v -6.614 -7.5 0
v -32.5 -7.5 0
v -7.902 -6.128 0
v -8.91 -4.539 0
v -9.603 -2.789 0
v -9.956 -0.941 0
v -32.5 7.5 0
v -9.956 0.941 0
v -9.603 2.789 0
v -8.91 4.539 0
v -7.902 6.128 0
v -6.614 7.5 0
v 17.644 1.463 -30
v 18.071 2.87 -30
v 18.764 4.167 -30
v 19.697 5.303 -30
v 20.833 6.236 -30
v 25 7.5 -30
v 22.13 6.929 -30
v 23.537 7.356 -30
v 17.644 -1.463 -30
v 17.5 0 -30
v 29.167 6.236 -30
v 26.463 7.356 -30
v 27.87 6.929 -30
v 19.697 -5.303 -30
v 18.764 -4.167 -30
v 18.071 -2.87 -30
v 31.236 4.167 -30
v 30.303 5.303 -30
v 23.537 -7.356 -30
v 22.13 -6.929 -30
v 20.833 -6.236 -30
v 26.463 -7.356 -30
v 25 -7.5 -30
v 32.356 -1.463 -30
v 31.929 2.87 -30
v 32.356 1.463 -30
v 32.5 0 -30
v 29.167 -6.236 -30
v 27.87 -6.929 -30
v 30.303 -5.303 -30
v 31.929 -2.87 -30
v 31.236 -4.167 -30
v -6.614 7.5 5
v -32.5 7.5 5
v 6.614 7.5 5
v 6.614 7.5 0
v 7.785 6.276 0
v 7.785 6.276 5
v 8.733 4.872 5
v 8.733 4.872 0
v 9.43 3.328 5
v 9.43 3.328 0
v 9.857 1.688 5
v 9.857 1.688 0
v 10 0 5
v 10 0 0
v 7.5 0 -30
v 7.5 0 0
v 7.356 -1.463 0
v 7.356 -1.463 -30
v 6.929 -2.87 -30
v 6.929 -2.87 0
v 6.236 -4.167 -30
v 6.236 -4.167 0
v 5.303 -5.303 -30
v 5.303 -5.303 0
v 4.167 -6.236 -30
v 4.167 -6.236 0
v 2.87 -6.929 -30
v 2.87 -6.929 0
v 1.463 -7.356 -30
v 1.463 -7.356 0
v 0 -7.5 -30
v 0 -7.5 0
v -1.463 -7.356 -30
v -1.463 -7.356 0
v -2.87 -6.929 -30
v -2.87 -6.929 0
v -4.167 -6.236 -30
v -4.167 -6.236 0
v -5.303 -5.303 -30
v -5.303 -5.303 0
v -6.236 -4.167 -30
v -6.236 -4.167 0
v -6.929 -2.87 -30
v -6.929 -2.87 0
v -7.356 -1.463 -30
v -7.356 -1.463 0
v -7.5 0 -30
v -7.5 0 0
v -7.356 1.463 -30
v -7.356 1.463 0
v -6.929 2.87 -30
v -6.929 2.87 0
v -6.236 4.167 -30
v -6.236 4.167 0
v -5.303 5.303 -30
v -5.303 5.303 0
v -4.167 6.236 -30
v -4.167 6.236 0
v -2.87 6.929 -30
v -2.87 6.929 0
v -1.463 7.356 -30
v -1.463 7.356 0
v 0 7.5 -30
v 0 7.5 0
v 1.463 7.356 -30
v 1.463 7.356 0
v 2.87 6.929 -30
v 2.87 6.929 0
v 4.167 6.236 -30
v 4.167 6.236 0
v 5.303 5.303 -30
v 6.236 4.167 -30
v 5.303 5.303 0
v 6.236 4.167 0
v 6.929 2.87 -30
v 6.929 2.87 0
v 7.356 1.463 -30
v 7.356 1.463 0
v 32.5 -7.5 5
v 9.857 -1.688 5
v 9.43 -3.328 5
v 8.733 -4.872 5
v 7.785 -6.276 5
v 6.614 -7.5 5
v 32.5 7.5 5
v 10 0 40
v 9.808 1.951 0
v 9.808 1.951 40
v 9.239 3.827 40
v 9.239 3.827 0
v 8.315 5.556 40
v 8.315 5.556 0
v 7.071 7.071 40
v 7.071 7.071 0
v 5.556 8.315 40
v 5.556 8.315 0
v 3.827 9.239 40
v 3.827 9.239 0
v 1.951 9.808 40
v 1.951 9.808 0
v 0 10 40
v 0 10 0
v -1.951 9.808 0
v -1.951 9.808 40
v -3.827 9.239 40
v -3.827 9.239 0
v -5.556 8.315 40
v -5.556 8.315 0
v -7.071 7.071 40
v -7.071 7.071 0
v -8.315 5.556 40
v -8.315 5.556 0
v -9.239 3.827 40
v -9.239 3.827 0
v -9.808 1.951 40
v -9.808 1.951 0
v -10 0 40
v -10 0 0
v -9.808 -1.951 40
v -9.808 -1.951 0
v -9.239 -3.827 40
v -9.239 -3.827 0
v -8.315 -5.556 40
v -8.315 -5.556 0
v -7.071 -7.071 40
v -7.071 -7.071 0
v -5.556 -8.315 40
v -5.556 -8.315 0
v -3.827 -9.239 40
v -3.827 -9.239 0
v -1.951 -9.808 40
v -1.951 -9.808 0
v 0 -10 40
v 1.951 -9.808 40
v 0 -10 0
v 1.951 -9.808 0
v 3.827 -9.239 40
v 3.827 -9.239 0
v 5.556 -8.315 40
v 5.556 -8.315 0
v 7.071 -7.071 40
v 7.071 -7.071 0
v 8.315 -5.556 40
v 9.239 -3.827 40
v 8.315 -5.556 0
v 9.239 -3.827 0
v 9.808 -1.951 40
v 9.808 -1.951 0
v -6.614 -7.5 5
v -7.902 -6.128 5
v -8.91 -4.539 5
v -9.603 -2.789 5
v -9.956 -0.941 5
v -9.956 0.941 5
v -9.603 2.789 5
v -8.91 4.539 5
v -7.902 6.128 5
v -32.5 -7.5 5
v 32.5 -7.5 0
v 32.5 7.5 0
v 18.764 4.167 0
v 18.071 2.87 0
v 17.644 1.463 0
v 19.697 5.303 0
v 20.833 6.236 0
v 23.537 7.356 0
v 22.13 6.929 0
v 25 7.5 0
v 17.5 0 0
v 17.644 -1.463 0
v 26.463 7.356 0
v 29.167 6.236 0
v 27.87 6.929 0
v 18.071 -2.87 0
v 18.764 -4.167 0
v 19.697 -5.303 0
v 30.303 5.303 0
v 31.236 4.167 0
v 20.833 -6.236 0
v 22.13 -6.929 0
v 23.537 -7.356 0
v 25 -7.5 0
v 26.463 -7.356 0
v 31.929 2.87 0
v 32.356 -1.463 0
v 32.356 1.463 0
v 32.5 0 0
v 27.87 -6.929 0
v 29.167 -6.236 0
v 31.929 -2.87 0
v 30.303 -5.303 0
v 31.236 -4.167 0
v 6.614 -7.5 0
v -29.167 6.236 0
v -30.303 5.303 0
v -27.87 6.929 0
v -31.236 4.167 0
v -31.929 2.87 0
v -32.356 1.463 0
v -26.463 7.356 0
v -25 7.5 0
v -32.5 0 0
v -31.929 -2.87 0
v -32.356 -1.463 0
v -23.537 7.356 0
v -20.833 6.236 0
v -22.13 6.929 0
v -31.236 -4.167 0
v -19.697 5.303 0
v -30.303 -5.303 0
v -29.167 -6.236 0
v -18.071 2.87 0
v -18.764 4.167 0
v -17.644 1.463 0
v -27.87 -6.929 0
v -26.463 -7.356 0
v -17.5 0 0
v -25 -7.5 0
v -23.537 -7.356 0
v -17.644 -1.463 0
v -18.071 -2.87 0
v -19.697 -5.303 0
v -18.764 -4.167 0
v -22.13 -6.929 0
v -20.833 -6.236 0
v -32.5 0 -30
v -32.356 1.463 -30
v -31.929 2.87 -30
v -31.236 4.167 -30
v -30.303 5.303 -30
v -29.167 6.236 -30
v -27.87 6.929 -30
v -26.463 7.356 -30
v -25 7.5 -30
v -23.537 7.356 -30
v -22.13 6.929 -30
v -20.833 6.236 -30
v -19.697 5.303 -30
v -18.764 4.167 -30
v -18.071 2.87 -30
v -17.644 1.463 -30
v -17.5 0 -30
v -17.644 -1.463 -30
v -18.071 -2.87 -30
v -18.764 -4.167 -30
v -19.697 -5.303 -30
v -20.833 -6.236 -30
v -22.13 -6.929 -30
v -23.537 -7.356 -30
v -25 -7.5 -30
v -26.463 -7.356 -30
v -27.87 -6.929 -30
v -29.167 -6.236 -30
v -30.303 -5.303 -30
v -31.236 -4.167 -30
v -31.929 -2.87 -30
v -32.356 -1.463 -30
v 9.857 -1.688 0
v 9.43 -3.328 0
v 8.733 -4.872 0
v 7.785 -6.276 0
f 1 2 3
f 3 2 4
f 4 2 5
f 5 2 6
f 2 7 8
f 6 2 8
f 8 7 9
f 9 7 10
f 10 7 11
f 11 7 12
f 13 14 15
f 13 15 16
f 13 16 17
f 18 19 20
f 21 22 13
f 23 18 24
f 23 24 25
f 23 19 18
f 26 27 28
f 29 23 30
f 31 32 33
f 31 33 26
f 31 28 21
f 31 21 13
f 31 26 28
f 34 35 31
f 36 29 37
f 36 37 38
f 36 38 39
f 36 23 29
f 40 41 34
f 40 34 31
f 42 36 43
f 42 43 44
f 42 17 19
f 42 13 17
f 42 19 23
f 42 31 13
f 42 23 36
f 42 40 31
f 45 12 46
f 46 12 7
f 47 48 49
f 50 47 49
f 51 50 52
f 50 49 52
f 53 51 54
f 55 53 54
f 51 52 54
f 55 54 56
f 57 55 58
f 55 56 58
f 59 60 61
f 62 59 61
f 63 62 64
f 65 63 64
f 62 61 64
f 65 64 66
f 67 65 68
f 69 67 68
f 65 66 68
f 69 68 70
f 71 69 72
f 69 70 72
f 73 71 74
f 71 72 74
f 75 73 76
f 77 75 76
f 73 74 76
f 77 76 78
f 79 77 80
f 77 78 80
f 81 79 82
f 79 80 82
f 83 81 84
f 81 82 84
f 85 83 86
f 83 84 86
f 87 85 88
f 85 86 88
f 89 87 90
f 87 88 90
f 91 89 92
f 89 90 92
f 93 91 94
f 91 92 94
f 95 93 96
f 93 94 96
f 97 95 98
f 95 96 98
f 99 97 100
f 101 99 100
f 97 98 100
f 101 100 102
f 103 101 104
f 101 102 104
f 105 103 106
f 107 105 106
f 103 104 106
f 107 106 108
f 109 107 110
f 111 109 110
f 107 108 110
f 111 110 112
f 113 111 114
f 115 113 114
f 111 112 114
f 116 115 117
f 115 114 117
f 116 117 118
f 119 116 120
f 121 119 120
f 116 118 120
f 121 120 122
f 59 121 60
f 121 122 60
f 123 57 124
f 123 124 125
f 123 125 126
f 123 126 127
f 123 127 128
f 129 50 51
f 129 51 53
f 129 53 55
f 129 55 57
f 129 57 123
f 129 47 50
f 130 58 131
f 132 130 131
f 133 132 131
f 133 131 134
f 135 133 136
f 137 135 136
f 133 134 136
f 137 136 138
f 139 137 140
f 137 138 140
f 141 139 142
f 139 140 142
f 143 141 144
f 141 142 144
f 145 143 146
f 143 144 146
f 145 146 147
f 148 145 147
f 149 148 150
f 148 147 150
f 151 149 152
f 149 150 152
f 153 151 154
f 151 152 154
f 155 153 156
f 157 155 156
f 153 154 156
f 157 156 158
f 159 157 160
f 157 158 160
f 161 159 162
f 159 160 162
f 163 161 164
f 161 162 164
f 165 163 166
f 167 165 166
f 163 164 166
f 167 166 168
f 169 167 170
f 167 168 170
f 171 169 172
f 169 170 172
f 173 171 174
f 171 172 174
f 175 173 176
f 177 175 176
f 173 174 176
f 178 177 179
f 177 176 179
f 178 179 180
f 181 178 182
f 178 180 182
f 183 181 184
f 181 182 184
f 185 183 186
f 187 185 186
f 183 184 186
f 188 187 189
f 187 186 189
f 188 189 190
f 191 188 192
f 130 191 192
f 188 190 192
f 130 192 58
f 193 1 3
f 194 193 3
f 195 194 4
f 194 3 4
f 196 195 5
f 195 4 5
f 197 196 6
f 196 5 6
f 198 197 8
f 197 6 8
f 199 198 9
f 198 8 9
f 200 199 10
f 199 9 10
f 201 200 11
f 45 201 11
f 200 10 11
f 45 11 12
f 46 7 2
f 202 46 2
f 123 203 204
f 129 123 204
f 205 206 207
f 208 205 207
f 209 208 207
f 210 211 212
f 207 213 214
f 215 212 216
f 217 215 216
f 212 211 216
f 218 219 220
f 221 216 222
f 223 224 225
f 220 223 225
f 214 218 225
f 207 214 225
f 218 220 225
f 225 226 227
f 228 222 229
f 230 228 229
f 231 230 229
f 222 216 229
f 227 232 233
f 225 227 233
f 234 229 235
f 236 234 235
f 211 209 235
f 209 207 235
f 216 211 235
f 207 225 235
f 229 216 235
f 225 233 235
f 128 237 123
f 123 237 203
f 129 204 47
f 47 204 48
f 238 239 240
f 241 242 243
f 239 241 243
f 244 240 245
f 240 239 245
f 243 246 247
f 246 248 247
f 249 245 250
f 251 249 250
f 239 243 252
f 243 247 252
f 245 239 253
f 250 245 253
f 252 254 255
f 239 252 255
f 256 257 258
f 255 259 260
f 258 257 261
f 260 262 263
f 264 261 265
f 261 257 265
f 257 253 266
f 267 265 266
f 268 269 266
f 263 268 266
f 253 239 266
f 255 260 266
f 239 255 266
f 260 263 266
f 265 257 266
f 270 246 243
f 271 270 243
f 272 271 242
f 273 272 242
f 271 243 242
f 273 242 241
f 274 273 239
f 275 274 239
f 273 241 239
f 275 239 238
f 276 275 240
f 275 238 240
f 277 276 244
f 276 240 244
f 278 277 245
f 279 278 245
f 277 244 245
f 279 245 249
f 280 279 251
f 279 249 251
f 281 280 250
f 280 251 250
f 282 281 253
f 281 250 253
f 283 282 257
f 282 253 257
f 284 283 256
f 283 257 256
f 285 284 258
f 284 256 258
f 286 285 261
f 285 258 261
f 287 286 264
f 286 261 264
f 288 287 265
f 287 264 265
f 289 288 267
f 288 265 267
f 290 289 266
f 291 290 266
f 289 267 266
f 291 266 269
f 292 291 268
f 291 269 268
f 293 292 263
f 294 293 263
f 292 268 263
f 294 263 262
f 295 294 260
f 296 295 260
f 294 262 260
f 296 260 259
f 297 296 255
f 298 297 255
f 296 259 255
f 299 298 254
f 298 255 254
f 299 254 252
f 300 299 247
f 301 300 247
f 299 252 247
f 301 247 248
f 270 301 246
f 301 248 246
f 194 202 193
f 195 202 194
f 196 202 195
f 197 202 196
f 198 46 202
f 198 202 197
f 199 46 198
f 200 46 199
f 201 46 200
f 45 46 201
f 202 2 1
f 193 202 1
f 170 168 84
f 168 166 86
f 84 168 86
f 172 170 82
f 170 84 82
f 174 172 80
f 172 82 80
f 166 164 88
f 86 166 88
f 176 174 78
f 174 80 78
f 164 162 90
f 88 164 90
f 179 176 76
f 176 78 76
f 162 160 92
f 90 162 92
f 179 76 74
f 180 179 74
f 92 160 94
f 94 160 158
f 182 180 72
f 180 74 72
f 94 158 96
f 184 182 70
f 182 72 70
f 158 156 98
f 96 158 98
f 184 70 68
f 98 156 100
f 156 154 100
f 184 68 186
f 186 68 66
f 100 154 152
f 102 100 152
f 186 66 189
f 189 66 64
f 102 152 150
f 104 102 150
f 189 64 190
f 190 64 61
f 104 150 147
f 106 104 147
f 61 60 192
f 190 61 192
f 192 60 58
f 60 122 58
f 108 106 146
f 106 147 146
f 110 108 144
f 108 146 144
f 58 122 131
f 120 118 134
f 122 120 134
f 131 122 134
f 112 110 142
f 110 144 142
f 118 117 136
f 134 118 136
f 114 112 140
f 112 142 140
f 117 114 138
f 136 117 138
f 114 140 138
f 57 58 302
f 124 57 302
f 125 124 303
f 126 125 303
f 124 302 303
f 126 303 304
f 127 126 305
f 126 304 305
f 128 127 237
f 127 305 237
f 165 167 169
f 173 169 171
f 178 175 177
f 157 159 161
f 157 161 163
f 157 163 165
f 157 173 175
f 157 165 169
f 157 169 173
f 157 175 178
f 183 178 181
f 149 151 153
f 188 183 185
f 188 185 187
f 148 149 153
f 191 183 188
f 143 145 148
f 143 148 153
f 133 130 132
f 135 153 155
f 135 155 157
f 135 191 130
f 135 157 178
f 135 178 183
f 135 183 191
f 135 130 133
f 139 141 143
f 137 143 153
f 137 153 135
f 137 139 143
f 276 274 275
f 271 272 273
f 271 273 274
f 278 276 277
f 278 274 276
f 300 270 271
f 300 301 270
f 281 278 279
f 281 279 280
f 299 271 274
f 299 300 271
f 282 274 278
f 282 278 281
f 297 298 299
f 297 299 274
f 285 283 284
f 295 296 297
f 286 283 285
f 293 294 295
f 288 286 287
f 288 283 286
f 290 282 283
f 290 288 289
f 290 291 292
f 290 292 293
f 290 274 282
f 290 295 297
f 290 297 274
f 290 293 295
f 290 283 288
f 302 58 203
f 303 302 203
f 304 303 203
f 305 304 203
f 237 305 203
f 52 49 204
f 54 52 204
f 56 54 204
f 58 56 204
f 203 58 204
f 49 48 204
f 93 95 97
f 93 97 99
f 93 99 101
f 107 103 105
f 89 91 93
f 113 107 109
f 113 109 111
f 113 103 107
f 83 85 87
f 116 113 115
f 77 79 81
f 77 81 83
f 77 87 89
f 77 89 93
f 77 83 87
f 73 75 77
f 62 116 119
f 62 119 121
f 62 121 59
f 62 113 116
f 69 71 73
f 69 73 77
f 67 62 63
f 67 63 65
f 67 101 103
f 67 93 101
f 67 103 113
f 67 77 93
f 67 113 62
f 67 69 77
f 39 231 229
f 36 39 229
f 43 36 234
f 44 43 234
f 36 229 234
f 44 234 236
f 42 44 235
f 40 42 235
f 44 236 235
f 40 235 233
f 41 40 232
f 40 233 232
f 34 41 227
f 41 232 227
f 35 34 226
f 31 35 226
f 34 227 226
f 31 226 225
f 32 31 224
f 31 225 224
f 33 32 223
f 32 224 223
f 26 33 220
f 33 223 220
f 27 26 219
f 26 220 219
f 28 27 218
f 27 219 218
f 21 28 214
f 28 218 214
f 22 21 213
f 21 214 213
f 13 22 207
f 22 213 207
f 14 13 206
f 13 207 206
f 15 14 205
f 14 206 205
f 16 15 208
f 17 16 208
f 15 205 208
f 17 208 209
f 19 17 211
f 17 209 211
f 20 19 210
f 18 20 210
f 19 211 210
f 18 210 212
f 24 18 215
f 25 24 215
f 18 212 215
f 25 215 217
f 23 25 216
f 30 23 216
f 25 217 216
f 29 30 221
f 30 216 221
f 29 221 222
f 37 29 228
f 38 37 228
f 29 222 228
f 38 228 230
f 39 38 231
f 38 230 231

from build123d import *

# Parameters (mm, degrees)
F1_DEPTH = 5
F2_R     = 10
F3_DEPTH = 40
F4_R     = 7.5
F5_DEPTH = 30
F7_DEPTH = 30
F6_R     = 7.5


with BuildPart() as f1:
    # F0 (on Top) → F1 (new body)
    with BuildSketch(Plane.XY):
        with BuildLine():
            ThreePointArc((6.6143782777, 7.5), (9.1143782777, 4.1143782777), (10, 0))
            ThreePointArc((10, 0), (9.1143782777, -4.1143782777), (6.6143782777, -7.5))
            Line((6.6143782777, -7.5), (32.5, -7.5))
            Line((32.5, -7.5), (32.5, 7.5))
            Line((32.5, 7.5), (6.6143782777, 7.5))
        make_face()
    extrude(amount=F1_DEPTH)


with BuildPart() as f1b:
    # F0 (on Top) → F1, piece 2 (new body)
    with BuildSketch(Plane.XY):
        with BuildLine():
            ThreePointArc((-6.6143782777, -7.5), (-10, 0), (-6.6143782777, 7.5))
            Line((-6.6143782777, 7.5), (-32.5, 7.5))
            Line((-32.5, 7.5), (-32.5, -7.5))
            Line((-32.5, -7.5), (-6.6143782777, -7.5))
        make_face()
    extrude(amount=F1_DEPTH)


with BuildPart() as f3:
    # F2 (on Top) → F3 (new body)
    with BuildSketch(Plane.XY):
        Circle(F2_R)
    extrude(amount=F3_DEPTH)

    # F4 (on face) → F5 (join)
    with BuildSketch(Plane(origin=(0, 0, 0), x_dir=(1, 0, 0), z_dir=(0, 0, -1))):
        Circle(F4_R)
    extrude(amount=F5_DEPTH)


with BuildPart() as f7:
    # F6 (on face) → F7 (new body)
    with BuildSketch(Plane(origin=(0, 0, 0), x_dir=(1, 0, 0), z_dir=(0, 0, -1))):
        with BuildLine():
            ThreePointArc((-25, -7.5), (-19.6966991411, -5.3033008589), (-17.5, 0))
            ThreePointArc((-17.5, 0), (-19.6966991411, 5.3033008589), (-25, 7.5))
            ThreePointArc((-25, 7.5), (-30.3033008589, 5.3033008589), (-32.5, 0))
            ThreePointArc((-32.5, 0), (-30.3033008589, -5.3033008589), (-25, -7.5))
        make_face()
    extrude(amount=F7_DEPTH)


with BuildPart() as f7b:
    # F6 (on face) → F7, piece 2 (new body)
    with BuildSketch(Plane(origin=(0, 0, 0), x_dir=(1, 0, 0), z_dir=(0, 0, -1))):
        with Locations((25, 0)):
            Circle(F6_R)
    extrude(amount=F7_DEPTH)


solid = Compound([f1.part, f1b.part, f3.part, f7.part, f7b.part])
